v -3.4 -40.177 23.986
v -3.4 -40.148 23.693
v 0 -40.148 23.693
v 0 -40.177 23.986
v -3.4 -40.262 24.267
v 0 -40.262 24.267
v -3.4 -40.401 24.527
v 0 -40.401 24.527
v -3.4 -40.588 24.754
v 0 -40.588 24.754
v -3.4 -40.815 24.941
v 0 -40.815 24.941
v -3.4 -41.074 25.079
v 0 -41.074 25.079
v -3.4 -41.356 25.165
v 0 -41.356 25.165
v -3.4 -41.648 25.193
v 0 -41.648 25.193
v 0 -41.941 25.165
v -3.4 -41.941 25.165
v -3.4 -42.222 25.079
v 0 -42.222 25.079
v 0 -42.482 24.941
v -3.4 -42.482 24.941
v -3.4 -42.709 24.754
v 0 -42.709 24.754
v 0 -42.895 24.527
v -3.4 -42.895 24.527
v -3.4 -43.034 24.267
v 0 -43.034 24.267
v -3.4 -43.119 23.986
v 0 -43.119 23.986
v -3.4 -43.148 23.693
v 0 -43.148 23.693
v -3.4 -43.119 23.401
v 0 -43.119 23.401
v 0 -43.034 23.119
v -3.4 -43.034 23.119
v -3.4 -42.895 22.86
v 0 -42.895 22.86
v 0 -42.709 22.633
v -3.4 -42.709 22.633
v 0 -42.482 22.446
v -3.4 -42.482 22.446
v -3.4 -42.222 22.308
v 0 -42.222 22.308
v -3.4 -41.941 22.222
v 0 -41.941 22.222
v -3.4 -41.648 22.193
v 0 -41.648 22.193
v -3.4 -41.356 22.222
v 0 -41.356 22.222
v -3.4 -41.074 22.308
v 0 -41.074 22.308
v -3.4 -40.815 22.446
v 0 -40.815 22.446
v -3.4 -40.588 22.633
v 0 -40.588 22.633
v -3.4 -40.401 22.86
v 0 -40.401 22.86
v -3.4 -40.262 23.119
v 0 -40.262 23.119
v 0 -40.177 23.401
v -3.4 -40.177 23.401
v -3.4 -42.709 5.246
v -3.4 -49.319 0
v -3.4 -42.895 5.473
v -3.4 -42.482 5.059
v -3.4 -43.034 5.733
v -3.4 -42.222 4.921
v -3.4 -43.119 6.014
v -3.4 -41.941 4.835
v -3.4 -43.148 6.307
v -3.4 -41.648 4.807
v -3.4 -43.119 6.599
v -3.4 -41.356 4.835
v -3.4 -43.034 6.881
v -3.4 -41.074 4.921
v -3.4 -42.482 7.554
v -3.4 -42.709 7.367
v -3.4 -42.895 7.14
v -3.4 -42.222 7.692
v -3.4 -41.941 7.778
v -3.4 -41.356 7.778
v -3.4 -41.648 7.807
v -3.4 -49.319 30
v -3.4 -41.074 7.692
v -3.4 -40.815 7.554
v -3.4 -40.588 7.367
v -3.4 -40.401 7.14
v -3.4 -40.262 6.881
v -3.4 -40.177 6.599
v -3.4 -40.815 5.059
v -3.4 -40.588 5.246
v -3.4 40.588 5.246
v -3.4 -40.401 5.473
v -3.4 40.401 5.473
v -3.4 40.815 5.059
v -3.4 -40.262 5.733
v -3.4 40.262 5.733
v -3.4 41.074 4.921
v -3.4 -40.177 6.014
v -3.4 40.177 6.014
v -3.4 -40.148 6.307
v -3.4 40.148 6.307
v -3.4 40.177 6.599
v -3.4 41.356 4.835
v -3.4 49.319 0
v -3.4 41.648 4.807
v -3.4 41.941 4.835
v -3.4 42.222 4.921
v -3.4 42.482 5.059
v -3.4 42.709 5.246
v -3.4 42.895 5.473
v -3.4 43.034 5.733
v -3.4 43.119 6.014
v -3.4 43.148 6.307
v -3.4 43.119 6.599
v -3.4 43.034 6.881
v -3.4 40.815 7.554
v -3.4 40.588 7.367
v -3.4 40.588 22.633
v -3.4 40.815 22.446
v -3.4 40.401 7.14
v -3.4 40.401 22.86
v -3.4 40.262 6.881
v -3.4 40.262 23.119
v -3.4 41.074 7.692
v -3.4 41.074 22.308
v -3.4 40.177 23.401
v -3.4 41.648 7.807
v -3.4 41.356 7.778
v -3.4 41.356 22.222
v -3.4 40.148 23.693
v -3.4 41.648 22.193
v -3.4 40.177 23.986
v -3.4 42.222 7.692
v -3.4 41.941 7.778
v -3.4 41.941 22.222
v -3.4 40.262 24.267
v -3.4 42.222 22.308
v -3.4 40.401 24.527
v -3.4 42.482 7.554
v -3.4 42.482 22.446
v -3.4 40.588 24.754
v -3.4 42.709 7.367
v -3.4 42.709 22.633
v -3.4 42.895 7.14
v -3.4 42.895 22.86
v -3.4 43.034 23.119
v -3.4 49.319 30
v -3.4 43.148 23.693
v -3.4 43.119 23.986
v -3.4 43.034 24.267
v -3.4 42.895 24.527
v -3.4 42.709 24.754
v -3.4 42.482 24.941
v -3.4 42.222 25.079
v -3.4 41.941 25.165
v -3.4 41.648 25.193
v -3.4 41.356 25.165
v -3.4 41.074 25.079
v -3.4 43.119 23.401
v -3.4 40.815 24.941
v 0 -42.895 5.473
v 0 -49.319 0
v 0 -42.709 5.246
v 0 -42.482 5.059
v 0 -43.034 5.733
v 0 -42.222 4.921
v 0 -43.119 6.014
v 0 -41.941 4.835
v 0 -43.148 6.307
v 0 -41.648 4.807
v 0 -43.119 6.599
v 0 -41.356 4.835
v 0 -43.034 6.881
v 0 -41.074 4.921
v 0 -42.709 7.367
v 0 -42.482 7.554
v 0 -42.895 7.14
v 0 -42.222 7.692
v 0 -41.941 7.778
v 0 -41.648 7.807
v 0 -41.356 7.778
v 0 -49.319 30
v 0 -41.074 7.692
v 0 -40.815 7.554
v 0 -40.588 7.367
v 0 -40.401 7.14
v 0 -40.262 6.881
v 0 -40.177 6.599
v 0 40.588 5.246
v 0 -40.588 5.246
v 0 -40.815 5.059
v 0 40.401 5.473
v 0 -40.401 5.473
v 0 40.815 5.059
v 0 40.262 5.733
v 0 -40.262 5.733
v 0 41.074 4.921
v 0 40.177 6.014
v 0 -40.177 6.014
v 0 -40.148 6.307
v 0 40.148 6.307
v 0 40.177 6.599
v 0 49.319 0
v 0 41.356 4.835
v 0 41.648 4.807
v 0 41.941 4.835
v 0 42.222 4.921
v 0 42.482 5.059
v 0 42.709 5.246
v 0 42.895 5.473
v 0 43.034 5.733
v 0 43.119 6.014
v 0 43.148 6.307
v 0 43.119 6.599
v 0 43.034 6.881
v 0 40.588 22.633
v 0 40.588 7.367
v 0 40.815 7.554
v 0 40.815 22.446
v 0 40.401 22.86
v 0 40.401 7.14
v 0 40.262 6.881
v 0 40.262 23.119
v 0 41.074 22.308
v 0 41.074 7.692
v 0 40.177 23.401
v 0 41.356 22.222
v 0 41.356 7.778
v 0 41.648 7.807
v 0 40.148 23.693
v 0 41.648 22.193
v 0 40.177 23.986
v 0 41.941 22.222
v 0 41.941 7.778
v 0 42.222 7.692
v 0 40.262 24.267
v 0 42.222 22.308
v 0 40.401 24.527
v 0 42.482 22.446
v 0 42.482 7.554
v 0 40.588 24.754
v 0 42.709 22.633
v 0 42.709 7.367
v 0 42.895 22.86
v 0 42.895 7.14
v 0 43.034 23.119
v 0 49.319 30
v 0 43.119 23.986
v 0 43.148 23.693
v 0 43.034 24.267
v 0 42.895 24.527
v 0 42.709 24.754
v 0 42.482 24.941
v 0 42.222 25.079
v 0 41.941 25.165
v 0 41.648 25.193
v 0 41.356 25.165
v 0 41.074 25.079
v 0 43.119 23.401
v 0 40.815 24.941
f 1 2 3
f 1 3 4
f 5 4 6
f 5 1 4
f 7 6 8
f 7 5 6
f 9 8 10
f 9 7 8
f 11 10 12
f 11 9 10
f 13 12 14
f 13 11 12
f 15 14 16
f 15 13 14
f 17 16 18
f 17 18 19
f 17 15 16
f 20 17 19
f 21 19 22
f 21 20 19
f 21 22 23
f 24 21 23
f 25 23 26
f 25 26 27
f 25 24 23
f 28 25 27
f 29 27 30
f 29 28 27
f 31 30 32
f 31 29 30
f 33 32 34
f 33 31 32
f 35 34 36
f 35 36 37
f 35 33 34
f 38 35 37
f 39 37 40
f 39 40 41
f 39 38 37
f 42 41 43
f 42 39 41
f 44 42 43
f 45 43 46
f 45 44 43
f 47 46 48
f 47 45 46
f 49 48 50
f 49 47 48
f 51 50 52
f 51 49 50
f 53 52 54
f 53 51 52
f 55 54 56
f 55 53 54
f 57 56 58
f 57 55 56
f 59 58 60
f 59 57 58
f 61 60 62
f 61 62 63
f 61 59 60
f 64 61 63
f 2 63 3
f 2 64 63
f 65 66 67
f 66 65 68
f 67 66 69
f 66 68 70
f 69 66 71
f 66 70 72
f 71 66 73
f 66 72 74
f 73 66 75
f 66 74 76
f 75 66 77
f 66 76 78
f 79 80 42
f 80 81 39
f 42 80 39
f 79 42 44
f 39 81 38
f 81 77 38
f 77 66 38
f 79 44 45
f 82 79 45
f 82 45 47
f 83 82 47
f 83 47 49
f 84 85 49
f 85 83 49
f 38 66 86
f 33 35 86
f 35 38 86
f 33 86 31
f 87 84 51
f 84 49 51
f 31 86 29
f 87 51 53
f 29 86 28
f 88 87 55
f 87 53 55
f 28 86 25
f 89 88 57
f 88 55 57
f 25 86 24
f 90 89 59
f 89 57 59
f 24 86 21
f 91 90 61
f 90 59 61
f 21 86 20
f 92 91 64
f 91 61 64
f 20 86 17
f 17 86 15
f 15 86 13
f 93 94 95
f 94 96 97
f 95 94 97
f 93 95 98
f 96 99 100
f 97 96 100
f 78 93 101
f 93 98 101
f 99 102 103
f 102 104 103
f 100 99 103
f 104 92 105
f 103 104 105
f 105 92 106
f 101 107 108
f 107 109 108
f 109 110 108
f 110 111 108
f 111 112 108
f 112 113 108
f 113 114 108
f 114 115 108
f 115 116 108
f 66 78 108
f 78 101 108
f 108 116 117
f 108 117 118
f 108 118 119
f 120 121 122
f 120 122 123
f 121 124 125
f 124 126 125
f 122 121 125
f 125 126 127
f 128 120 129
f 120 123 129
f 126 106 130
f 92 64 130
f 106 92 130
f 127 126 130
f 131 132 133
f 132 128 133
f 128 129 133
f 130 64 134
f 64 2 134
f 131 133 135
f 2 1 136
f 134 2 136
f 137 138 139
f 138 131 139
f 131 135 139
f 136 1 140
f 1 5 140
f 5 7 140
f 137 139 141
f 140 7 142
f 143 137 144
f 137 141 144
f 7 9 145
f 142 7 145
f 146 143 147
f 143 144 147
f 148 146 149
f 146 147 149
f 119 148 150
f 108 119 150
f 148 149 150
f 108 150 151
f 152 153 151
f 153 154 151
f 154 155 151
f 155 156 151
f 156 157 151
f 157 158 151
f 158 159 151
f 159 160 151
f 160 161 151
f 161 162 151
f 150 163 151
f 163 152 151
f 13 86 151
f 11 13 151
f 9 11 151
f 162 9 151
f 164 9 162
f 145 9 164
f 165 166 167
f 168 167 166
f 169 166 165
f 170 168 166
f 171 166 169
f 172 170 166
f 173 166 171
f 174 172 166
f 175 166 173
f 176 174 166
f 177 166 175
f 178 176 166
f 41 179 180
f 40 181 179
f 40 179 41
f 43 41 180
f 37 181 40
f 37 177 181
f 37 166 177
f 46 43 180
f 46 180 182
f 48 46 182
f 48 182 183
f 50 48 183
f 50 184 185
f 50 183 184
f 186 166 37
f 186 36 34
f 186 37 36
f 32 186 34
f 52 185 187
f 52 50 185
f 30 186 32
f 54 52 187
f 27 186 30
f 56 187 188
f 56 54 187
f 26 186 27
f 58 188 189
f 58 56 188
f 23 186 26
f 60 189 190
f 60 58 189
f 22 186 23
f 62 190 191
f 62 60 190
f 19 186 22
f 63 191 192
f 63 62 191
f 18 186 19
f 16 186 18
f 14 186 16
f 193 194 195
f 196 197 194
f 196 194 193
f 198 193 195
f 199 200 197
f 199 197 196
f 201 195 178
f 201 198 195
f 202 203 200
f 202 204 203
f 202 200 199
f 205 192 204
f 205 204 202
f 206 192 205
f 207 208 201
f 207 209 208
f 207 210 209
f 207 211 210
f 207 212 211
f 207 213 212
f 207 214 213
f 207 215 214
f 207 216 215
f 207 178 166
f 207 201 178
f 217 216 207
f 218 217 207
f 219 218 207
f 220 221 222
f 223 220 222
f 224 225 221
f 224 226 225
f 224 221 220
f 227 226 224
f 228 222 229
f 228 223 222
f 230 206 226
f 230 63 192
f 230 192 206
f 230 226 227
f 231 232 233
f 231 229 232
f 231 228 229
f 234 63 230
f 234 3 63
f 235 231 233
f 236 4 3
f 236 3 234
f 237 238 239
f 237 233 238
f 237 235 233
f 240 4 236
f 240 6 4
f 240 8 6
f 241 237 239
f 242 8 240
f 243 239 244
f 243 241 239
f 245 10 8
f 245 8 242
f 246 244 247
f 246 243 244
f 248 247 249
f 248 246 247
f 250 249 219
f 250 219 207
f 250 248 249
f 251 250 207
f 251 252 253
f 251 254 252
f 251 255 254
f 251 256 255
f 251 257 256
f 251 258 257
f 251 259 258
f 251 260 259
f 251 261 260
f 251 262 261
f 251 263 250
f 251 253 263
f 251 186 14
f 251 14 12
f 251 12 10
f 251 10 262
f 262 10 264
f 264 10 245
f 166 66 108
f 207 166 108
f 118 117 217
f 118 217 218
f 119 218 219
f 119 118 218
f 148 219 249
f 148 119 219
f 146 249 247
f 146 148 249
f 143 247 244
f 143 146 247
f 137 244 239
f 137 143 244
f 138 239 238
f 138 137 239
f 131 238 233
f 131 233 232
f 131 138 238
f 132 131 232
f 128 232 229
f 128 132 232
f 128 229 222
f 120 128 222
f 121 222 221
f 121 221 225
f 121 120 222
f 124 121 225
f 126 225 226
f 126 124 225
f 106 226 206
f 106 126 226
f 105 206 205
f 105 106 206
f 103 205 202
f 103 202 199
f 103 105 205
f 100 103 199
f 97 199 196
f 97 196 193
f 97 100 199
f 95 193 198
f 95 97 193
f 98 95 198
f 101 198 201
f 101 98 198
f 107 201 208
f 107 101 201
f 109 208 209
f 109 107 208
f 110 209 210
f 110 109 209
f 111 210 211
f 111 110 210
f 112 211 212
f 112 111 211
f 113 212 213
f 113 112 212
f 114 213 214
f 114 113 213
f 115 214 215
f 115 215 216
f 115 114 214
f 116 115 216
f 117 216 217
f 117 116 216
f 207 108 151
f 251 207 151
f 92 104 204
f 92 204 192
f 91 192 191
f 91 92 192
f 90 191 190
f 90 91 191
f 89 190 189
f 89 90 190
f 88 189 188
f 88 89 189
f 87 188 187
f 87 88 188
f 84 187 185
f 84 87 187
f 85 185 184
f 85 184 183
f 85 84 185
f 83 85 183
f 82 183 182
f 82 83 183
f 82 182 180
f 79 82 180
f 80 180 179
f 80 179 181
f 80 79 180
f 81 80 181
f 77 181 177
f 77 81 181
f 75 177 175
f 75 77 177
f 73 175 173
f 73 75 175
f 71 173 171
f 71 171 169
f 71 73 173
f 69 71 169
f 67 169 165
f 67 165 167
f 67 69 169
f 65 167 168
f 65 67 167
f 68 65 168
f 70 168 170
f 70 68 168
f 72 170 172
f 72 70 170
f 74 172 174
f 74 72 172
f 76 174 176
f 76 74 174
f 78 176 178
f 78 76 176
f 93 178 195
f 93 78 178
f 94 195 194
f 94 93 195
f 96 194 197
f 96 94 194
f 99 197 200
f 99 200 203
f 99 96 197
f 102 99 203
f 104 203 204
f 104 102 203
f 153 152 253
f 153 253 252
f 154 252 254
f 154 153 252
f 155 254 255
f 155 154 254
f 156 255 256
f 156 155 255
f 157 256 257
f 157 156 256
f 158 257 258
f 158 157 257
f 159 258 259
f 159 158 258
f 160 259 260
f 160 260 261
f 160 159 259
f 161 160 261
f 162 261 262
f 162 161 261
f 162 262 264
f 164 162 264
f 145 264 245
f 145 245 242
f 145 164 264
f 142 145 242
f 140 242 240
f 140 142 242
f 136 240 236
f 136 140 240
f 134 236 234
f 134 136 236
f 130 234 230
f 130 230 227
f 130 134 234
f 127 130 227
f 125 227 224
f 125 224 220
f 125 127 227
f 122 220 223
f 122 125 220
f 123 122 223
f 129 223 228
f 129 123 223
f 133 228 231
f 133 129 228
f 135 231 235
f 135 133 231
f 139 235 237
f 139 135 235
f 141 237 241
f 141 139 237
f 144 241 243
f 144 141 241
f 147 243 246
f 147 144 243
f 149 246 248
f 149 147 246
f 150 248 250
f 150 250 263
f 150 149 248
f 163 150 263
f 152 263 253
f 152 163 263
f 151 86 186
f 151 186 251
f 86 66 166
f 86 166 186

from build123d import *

# Parameters (mm, degrees)
SKETCH11_W                     = 3.4
SKETCH11_H                     = 62.2
BASE_FLANGE3_DEPTH             = 30
EDGE_FLANGE1_STRIP_W           = 15.1
EDGE_FLANGE1_STRIP_H           = 3.4
EDGE_FLANGE1_STRIP_CUT_DEPTH   = 30
EDGE_FLANGE1_STRIP_2_W         = 15.1
EDGE_FLANGE1_STRIP_2_H         = 3.4
EDGE_FLANGE1_STRIP_CUT_2_DEPTH = 30
EDGE_FLANGE1_DEPTH             = 30
EDGE_FLANGE1_BEND_DEPTH        = 30
SKETCH22_R                     = 1.5
CUT_EXTRUDE1_DEPTH             = 72.894645141
UNFOLD1_START                  = -20
UNFOLD1_OUTLINE_W              = 62.2
UNFOLD1_OUTLINE_H              = 30
UNFOLD1_DEPTH                  = 16.6
UNFOLD1_START_2                = -3.4
UNFOLD1_2_OUTLINE_W            = 98.637609512
UNFOLD1_2_OUTLINE_H            = 30
UNFOLD1_2_OUTLINE_R            = 1.5
UNFOLD1_2_DEPTH                = 3.4


# Read off the part's stored shape, not the designer's step: Unfold1
# Sheet-metal steps are written as plain solids
with BuildPart() as part:
    # Sketch11 → Base-Flange3 (new body)
    with BuildSketch(Plane.XY):
        with Locations((-1.7, 0)):
            Rectangle(SKETCH11_W, SKETCH11_H)
    extrude(amount=BASE_FLANGE3_DEPTH)

    # Edge-Flange1 strip (across the edge) → Edge-Flange1 strip cut (cut)
    with BuildSketch(Plane(origin=(-3.4, 31.1, 30), x_dir=(0, -1, 0), z_dir=(0, 0, -1))):
        with Locations((-3.4, -1.7)):
            Rectangle(EDGE_FLANGE1_STRIP_W, EDGE_FLANGE1_STRIP_H)
    extrude(amount=EDGE_FLANGE1_STRIP_CUT_DEPTH, mode=Mode.SUBTRACT)

    # Edge-Flange1 strip 2 (across the edge) → Edge-Flange1 strip cut 2 (cut)
    with BuildSketch(Plane(origin=(-3.4, -31.1, 0), x_dir=(0, 1, 0), z_dir=(0, 0, 1))):
        with Locations((-3.4, -1.7)):
            Rectangle(EDGE_FLANGE1_STRIP_2_W, EDGE_FLANGE1_STRIP_2_H)
    extrude(amount=EDGE_FLANGE1_STRIP_CUT_2_DEPTH, mode=Mode.SUBTRACT)

    # Edge-Flange1 section (across the edge) → Edge-Flange1 (add)
    with BuildSketch(Plane(origin=(-3.4, 31.1, 30), x_dir=(0, -1, 0), z_dir=(0, 0, -1))):
        with BuildLine():
            Line((0, 0.75), (0, 16.6))
            Line((0, 16.6), (3.4, 16.6))
            Line((3.4, 16.6), (3.4, 0.75))
            ThreePointArc((3.4, 0.75), (3.619669914, 0.219669914), (4.15, 0))
            Line((4.15, 0), (4.15, -3.4))
            ThreePointArc((4.15, -3.4), (1.215506858, -2.184493142), (0, 0.75))
        make_face()
    extrude(amount=EDGE_FLANGE1_DEPTH)

    # Edge-Flange1 section 2 (across the edge) → Edge-Flange1 bend (add)
    with BuildSketch(Plane(origin=(-3.4, -31.1, 0), x_dir=(0, 1, 0), z_dir=(0, 0, 1))):
        with BuildLine():
            Line((0, 0.75), (0, 16.6))
            Line((0, 16.6), (3.4, 16.6))
            Line((3.4, 16.6), (3.4, 0.75))
            ThreePointArc((3.4, 0.75), (3.619669914, 0.219669914), (4.15, 0))
            Line((4.15, 0), (4.15, -3.4))
            ThreePointArc((4.15, -3.4), (1.215506858, -2.184493142), (0, 0.75))
        make_face()
    extrude(amount=EDGE_FLANGE1_BEND_DEPTH)

    # Sketch22 → Cut-Extrude1 (cut, through all)
    with BuildSketch(Plane(origin=(0, 31.1, 0), x_dir=(1, 0, 0), z_dir=(0, 1, 0))):
        with Locations(Location((-12.329371406, -23.693332437, 0), (0, 0, 180))):
            Circle(SKETCH22_R)
        with Locations(Location((-12.329371406, -6.306667563, 0), (0, 0, 180))):
            Circle(SKETCH22_R)
    extrude(amount=-CUT_EXTRUDE1_DEPTH, mode=Mode.SUBTRACT)

    # Unfold1 outline → Unfold1 (cut)
    with BuildSketch(Plane.YZ.offset(UNFOLD1_START)):
        with Locations((0, 15)):
            Rectangle(UNFOLD1_OUTLINE_W, UNFOLD1_OUTLINE_H)
    extrude(amount=UNFOLD1_DEPTH, mode=Mode.SUBTRACT)

    # Unfold1 2 outline → Unfold1 2 (add)
    with BuildSketch(Plane.YZ.offset(UNFOLD1_START_2)):
        with Locations((0, 15)):
            Rectangle(UNFOLD1_2_OUTLINE_W, UNFOLD1_2_OUTLINE_H)
        with Locations((41.648176162, 23.693332437)):
            Circle(UNFOLD1_2_OUTLINE_R, mode=Mode.SUBTRACT)
        with Locations((41.648176162, 6.306667563)):
            Circle(UNFOLD1_2_OUTLINE_R, mode=Mode.SUBTRACT)
        with Locations((-41.648176162, 23.693332437)):
            Circle(UNFOLD1_2_OUTLINE_R, mode=Mode.SUBTRACT)
        with Locations((-41.648176162, 6.306667563)):
            Circle(UNFOLD1_2_OUTLINE_R, mode=Mode.SUBTRACT)
    extrude(amount=UNFOLD1_2_DEPTH)


solid = part.part
